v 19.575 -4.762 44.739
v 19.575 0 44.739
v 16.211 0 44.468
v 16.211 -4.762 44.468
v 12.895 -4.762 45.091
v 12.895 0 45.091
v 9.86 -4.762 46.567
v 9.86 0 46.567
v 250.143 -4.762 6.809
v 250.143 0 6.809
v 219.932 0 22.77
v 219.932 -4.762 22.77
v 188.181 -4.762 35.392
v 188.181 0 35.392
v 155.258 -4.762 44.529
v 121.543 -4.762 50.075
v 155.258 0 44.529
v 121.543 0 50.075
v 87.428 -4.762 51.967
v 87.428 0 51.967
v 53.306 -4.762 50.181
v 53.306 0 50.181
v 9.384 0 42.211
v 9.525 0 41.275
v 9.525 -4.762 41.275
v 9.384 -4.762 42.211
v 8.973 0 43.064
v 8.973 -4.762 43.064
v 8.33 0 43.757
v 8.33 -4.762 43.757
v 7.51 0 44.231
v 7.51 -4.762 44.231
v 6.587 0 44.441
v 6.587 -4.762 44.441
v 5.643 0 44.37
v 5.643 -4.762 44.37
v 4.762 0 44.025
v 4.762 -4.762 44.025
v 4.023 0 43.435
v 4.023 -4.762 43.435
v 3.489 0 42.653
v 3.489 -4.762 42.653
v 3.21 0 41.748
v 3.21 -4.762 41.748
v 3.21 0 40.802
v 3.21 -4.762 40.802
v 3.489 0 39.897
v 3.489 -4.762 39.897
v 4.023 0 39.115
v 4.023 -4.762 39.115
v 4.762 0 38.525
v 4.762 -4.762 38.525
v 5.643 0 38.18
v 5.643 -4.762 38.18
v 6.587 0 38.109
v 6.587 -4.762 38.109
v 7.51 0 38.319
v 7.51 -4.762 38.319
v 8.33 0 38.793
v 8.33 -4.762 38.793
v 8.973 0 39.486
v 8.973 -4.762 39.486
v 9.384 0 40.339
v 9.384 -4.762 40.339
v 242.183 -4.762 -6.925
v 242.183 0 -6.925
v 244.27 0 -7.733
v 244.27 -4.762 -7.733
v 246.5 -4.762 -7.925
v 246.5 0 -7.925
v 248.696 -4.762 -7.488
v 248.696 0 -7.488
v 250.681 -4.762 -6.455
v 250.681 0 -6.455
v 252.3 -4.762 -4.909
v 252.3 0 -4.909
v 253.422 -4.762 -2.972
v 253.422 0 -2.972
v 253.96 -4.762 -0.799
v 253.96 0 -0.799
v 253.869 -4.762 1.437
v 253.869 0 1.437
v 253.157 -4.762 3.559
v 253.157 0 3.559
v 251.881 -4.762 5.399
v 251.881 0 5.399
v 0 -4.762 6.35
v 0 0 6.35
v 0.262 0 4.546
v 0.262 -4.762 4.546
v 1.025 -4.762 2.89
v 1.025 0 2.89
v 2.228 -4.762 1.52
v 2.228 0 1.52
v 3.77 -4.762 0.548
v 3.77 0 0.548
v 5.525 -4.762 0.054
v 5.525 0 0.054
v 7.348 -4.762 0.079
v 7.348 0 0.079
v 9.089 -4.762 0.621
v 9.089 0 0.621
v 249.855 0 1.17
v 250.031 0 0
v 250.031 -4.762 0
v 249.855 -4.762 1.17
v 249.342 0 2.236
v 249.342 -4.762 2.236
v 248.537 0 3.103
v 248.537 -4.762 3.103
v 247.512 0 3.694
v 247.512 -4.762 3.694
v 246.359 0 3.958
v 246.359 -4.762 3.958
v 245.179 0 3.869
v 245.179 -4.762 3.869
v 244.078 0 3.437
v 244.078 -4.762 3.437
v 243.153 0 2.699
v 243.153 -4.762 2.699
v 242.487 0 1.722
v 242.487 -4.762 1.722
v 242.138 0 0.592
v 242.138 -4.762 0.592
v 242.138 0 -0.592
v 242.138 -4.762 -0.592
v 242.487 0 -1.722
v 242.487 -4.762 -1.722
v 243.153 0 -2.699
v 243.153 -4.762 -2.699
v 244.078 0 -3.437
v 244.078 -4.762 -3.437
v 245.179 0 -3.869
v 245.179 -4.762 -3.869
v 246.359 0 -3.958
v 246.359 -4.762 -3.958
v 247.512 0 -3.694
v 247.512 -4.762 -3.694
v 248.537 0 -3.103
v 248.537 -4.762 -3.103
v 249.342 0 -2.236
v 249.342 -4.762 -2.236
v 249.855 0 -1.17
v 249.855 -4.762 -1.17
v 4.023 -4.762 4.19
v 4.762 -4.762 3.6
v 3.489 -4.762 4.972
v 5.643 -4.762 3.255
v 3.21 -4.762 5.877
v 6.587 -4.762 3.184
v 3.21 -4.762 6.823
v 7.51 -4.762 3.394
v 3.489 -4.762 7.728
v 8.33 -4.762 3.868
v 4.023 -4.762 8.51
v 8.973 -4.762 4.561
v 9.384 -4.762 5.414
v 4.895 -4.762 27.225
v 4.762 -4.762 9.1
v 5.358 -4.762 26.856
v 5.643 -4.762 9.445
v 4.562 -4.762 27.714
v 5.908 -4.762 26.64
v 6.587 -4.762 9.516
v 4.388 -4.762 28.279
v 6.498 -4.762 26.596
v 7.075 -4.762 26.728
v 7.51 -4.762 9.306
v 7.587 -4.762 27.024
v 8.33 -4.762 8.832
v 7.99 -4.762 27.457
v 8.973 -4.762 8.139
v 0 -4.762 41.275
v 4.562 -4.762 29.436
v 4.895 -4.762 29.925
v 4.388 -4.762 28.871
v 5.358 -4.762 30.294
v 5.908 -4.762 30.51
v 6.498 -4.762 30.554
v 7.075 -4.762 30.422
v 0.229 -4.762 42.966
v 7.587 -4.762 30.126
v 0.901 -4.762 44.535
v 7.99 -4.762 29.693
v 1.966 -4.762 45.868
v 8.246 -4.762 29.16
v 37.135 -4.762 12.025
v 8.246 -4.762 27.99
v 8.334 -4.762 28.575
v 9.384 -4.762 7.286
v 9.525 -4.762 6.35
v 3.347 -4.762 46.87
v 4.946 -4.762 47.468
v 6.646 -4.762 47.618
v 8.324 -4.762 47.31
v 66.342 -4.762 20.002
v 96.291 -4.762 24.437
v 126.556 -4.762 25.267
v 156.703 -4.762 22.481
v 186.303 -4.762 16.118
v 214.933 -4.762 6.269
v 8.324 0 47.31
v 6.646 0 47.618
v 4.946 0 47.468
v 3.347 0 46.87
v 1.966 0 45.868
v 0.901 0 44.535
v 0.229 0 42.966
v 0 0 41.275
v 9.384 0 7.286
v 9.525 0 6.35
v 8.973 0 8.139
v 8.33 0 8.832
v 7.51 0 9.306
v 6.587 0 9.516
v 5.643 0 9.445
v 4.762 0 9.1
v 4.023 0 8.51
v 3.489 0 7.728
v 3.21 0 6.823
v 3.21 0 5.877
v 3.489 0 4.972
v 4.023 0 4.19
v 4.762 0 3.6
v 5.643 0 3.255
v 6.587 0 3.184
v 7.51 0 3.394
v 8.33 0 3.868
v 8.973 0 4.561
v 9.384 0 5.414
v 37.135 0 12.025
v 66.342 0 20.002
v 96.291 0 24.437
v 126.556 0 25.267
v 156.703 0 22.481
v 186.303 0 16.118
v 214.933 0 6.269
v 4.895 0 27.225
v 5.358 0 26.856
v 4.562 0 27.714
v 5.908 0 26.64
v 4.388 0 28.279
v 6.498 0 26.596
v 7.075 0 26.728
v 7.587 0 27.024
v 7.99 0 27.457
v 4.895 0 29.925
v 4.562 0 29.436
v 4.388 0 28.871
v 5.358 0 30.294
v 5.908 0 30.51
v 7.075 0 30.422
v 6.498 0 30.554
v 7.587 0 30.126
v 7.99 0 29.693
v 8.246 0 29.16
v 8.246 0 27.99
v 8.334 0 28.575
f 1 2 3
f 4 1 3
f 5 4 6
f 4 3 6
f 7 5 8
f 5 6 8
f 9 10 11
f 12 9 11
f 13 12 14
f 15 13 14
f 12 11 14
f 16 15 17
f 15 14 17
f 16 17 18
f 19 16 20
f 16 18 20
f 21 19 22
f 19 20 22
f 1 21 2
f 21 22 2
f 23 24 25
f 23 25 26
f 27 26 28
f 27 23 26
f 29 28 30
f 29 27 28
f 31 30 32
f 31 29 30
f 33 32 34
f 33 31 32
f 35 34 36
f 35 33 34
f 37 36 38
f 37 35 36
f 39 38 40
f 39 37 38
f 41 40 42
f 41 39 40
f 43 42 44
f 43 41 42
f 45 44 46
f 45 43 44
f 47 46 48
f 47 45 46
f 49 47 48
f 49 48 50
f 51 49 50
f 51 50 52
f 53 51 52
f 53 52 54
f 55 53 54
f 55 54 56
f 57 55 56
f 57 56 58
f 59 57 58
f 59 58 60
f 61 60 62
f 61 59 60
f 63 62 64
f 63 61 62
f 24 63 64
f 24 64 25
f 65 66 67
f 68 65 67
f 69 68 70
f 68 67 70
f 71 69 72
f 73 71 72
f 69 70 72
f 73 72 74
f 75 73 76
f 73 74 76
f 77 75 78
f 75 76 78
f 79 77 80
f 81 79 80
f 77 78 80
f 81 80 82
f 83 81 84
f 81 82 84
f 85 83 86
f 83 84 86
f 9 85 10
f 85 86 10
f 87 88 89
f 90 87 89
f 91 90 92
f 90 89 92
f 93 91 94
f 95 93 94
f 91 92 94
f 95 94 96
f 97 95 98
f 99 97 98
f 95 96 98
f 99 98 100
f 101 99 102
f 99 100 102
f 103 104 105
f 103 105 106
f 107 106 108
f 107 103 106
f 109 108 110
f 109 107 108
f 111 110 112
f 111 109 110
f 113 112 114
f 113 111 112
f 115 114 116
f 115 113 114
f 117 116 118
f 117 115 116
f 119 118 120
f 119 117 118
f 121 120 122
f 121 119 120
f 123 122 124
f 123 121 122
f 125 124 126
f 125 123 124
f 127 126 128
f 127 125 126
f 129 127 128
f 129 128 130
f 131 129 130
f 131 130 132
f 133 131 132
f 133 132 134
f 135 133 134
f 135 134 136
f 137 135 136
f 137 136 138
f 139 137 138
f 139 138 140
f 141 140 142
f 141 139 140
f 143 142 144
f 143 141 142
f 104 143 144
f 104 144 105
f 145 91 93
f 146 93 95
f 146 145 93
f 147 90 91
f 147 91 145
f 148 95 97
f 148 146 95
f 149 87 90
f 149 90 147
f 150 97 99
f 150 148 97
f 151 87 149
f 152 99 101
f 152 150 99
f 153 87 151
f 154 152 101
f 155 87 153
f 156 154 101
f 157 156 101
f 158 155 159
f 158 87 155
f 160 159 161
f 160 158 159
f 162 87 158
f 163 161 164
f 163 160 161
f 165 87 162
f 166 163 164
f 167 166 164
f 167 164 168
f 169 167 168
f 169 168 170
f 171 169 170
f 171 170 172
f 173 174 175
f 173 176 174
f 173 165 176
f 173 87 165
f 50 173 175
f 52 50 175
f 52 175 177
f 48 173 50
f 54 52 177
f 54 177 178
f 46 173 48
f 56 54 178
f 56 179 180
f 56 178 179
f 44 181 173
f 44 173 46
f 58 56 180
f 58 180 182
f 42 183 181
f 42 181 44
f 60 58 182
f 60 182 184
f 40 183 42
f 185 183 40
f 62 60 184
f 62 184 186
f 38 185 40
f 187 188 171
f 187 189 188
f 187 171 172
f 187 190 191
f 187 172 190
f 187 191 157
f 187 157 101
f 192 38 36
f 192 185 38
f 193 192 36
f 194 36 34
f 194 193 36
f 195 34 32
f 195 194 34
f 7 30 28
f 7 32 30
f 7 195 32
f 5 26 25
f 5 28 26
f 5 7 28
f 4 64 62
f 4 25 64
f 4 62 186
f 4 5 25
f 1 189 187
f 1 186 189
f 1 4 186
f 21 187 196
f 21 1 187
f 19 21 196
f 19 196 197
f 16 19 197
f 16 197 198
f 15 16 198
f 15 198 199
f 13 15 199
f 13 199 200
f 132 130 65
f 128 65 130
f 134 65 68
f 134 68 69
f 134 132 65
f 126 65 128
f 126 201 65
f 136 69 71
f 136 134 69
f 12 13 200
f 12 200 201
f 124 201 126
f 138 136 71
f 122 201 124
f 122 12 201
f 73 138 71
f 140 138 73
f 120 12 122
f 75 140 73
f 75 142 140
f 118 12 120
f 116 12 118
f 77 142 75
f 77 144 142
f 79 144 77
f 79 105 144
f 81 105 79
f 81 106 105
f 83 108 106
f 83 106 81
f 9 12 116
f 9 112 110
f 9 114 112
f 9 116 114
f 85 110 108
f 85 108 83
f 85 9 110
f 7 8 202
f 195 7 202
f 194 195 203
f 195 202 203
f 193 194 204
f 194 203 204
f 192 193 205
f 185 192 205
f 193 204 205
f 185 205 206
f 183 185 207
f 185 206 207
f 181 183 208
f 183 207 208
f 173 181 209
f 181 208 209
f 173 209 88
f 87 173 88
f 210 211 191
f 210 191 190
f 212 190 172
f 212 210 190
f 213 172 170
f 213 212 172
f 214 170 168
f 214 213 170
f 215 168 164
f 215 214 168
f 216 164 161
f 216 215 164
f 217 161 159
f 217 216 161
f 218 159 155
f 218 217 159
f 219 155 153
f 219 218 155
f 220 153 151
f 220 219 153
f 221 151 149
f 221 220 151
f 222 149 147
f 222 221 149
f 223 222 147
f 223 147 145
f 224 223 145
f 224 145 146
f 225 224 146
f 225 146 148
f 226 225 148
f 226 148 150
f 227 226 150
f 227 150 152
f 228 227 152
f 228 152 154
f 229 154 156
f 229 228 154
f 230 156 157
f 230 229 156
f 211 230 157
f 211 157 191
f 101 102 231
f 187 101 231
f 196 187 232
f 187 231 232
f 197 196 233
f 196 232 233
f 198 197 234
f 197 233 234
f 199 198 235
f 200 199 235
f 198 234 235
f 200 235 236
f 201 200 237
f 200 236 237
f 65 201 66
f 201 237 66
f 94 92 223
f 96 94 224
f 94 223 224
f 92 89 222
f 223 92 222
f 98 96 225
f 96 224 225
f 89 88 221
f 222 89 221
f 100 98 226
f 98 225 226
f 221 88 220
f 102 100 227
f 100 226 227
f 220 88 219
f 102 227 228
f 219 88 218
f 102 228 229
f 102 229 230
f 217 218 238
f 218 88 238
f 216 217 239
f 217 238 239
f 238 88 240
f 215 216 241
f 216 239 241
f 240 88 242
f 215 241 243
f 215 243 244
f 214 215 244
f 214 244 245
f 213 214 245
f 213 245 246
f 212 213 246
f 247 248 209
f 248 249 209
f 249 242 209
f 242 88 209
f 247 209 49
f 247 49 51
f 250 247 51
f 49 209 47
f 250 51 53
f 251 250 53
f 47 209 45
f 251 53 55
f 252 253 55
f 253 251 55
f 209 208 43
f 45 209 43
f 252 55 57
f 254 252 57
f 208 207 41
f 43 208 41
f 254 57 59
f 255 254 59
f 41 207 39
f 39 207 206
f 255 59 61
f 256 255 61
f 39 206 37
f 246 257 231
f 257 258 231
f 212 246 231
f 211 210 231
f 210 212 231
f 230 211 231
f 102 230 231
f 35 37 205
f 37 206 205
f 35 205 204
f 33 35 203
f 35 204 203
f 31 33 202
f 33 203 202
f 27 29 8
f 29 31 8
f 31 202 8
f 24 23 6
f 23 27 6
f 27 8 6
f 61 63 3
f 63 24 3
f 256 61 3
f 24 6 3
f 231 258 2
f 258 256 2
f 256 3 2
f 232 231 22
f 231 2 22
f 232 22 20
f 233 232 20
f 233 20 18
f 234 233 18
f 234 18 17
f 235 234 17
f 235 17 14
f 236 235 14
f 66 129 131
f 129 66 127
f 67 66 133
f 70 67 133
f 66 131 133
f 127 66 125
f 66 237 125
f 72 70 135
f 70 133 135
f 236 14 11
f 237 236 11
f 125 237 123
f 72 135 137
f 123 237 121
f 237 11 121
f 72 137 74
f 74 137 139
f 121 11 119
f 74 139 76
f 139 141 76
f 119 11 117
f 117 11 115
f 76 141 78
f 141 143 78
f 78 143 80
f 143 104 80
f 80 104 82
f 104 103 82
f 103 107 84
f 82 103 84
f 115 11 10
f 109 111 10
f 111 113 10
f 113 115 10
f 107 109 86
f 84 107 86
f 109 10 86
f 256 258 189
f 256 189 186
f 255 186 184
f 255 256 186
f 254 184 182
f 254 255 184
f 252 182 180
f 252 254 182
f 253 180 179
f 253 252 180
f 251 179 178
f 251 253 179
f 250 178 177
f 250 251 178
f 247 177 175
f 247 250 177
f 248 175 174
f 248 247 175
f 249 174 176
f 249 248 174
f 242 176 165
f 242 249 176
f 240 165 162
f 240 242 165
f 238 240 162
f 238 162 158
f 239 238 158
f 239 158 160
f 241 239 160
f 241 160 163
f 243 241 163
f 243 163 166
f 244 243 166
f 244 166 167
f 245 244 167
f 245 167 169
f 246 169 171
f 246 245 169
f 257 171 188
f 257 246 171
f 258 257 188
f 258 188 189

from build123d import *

# Parameters (mm, degrees)
F0_R     = 3.175
F0_R_2   = 3.96875
F0_R_3   = 1.984375
F1_DEPTH = 4.7625


with BuildPart() as f1:
    # F0 (on Front) → F1 (new body)
    with BuildSketch(Plane.XZ):
        with BuildLine():
            ThreePointArc((9.860095, 46.566667), (3.347218, 46.870159), (0, 41.275))
            Line((0, 41.275), (0, 6.35))
            ThreePointArc((0, 6.35), (2.964048, 0.978051), (9.089081, 0.621131))
            ThreePointArc((9.089081, 0.621131), (126.555864, 25.267368), (242.182661, -6.924648))
            ThreePointArc((242.182661, -6.924648), (252.929822, -3.980426), (250.142666, 6.808535))
            ThreePointArc((250.142666, 6.808535), (138.474992, 47.75611), (19.574735, 44.73912))
            ThreePointArc((19.574735, 44.73912), (14.532309, 44.668934), (9.860095, 46.566667))
        make_face()
        with Locations((6.35, 6.35)):
            Circle(F0_R, mode=Mode.SUBTRACT)
        with Locations((246.0625, 0)):
            Circle(F0_R_2, mode=Mode.SUBTRACT)
        with Locations((6.35, 28.575)):
            Circle(F0_R_3, mode=Mode.SUBTRACT)
        with Locations((6.35, 41.275)):
            Circle(F0_R, mode=Mode.SUBTRACT)
    extrude(amount=F1_DEPTH)


solid = f1.part
